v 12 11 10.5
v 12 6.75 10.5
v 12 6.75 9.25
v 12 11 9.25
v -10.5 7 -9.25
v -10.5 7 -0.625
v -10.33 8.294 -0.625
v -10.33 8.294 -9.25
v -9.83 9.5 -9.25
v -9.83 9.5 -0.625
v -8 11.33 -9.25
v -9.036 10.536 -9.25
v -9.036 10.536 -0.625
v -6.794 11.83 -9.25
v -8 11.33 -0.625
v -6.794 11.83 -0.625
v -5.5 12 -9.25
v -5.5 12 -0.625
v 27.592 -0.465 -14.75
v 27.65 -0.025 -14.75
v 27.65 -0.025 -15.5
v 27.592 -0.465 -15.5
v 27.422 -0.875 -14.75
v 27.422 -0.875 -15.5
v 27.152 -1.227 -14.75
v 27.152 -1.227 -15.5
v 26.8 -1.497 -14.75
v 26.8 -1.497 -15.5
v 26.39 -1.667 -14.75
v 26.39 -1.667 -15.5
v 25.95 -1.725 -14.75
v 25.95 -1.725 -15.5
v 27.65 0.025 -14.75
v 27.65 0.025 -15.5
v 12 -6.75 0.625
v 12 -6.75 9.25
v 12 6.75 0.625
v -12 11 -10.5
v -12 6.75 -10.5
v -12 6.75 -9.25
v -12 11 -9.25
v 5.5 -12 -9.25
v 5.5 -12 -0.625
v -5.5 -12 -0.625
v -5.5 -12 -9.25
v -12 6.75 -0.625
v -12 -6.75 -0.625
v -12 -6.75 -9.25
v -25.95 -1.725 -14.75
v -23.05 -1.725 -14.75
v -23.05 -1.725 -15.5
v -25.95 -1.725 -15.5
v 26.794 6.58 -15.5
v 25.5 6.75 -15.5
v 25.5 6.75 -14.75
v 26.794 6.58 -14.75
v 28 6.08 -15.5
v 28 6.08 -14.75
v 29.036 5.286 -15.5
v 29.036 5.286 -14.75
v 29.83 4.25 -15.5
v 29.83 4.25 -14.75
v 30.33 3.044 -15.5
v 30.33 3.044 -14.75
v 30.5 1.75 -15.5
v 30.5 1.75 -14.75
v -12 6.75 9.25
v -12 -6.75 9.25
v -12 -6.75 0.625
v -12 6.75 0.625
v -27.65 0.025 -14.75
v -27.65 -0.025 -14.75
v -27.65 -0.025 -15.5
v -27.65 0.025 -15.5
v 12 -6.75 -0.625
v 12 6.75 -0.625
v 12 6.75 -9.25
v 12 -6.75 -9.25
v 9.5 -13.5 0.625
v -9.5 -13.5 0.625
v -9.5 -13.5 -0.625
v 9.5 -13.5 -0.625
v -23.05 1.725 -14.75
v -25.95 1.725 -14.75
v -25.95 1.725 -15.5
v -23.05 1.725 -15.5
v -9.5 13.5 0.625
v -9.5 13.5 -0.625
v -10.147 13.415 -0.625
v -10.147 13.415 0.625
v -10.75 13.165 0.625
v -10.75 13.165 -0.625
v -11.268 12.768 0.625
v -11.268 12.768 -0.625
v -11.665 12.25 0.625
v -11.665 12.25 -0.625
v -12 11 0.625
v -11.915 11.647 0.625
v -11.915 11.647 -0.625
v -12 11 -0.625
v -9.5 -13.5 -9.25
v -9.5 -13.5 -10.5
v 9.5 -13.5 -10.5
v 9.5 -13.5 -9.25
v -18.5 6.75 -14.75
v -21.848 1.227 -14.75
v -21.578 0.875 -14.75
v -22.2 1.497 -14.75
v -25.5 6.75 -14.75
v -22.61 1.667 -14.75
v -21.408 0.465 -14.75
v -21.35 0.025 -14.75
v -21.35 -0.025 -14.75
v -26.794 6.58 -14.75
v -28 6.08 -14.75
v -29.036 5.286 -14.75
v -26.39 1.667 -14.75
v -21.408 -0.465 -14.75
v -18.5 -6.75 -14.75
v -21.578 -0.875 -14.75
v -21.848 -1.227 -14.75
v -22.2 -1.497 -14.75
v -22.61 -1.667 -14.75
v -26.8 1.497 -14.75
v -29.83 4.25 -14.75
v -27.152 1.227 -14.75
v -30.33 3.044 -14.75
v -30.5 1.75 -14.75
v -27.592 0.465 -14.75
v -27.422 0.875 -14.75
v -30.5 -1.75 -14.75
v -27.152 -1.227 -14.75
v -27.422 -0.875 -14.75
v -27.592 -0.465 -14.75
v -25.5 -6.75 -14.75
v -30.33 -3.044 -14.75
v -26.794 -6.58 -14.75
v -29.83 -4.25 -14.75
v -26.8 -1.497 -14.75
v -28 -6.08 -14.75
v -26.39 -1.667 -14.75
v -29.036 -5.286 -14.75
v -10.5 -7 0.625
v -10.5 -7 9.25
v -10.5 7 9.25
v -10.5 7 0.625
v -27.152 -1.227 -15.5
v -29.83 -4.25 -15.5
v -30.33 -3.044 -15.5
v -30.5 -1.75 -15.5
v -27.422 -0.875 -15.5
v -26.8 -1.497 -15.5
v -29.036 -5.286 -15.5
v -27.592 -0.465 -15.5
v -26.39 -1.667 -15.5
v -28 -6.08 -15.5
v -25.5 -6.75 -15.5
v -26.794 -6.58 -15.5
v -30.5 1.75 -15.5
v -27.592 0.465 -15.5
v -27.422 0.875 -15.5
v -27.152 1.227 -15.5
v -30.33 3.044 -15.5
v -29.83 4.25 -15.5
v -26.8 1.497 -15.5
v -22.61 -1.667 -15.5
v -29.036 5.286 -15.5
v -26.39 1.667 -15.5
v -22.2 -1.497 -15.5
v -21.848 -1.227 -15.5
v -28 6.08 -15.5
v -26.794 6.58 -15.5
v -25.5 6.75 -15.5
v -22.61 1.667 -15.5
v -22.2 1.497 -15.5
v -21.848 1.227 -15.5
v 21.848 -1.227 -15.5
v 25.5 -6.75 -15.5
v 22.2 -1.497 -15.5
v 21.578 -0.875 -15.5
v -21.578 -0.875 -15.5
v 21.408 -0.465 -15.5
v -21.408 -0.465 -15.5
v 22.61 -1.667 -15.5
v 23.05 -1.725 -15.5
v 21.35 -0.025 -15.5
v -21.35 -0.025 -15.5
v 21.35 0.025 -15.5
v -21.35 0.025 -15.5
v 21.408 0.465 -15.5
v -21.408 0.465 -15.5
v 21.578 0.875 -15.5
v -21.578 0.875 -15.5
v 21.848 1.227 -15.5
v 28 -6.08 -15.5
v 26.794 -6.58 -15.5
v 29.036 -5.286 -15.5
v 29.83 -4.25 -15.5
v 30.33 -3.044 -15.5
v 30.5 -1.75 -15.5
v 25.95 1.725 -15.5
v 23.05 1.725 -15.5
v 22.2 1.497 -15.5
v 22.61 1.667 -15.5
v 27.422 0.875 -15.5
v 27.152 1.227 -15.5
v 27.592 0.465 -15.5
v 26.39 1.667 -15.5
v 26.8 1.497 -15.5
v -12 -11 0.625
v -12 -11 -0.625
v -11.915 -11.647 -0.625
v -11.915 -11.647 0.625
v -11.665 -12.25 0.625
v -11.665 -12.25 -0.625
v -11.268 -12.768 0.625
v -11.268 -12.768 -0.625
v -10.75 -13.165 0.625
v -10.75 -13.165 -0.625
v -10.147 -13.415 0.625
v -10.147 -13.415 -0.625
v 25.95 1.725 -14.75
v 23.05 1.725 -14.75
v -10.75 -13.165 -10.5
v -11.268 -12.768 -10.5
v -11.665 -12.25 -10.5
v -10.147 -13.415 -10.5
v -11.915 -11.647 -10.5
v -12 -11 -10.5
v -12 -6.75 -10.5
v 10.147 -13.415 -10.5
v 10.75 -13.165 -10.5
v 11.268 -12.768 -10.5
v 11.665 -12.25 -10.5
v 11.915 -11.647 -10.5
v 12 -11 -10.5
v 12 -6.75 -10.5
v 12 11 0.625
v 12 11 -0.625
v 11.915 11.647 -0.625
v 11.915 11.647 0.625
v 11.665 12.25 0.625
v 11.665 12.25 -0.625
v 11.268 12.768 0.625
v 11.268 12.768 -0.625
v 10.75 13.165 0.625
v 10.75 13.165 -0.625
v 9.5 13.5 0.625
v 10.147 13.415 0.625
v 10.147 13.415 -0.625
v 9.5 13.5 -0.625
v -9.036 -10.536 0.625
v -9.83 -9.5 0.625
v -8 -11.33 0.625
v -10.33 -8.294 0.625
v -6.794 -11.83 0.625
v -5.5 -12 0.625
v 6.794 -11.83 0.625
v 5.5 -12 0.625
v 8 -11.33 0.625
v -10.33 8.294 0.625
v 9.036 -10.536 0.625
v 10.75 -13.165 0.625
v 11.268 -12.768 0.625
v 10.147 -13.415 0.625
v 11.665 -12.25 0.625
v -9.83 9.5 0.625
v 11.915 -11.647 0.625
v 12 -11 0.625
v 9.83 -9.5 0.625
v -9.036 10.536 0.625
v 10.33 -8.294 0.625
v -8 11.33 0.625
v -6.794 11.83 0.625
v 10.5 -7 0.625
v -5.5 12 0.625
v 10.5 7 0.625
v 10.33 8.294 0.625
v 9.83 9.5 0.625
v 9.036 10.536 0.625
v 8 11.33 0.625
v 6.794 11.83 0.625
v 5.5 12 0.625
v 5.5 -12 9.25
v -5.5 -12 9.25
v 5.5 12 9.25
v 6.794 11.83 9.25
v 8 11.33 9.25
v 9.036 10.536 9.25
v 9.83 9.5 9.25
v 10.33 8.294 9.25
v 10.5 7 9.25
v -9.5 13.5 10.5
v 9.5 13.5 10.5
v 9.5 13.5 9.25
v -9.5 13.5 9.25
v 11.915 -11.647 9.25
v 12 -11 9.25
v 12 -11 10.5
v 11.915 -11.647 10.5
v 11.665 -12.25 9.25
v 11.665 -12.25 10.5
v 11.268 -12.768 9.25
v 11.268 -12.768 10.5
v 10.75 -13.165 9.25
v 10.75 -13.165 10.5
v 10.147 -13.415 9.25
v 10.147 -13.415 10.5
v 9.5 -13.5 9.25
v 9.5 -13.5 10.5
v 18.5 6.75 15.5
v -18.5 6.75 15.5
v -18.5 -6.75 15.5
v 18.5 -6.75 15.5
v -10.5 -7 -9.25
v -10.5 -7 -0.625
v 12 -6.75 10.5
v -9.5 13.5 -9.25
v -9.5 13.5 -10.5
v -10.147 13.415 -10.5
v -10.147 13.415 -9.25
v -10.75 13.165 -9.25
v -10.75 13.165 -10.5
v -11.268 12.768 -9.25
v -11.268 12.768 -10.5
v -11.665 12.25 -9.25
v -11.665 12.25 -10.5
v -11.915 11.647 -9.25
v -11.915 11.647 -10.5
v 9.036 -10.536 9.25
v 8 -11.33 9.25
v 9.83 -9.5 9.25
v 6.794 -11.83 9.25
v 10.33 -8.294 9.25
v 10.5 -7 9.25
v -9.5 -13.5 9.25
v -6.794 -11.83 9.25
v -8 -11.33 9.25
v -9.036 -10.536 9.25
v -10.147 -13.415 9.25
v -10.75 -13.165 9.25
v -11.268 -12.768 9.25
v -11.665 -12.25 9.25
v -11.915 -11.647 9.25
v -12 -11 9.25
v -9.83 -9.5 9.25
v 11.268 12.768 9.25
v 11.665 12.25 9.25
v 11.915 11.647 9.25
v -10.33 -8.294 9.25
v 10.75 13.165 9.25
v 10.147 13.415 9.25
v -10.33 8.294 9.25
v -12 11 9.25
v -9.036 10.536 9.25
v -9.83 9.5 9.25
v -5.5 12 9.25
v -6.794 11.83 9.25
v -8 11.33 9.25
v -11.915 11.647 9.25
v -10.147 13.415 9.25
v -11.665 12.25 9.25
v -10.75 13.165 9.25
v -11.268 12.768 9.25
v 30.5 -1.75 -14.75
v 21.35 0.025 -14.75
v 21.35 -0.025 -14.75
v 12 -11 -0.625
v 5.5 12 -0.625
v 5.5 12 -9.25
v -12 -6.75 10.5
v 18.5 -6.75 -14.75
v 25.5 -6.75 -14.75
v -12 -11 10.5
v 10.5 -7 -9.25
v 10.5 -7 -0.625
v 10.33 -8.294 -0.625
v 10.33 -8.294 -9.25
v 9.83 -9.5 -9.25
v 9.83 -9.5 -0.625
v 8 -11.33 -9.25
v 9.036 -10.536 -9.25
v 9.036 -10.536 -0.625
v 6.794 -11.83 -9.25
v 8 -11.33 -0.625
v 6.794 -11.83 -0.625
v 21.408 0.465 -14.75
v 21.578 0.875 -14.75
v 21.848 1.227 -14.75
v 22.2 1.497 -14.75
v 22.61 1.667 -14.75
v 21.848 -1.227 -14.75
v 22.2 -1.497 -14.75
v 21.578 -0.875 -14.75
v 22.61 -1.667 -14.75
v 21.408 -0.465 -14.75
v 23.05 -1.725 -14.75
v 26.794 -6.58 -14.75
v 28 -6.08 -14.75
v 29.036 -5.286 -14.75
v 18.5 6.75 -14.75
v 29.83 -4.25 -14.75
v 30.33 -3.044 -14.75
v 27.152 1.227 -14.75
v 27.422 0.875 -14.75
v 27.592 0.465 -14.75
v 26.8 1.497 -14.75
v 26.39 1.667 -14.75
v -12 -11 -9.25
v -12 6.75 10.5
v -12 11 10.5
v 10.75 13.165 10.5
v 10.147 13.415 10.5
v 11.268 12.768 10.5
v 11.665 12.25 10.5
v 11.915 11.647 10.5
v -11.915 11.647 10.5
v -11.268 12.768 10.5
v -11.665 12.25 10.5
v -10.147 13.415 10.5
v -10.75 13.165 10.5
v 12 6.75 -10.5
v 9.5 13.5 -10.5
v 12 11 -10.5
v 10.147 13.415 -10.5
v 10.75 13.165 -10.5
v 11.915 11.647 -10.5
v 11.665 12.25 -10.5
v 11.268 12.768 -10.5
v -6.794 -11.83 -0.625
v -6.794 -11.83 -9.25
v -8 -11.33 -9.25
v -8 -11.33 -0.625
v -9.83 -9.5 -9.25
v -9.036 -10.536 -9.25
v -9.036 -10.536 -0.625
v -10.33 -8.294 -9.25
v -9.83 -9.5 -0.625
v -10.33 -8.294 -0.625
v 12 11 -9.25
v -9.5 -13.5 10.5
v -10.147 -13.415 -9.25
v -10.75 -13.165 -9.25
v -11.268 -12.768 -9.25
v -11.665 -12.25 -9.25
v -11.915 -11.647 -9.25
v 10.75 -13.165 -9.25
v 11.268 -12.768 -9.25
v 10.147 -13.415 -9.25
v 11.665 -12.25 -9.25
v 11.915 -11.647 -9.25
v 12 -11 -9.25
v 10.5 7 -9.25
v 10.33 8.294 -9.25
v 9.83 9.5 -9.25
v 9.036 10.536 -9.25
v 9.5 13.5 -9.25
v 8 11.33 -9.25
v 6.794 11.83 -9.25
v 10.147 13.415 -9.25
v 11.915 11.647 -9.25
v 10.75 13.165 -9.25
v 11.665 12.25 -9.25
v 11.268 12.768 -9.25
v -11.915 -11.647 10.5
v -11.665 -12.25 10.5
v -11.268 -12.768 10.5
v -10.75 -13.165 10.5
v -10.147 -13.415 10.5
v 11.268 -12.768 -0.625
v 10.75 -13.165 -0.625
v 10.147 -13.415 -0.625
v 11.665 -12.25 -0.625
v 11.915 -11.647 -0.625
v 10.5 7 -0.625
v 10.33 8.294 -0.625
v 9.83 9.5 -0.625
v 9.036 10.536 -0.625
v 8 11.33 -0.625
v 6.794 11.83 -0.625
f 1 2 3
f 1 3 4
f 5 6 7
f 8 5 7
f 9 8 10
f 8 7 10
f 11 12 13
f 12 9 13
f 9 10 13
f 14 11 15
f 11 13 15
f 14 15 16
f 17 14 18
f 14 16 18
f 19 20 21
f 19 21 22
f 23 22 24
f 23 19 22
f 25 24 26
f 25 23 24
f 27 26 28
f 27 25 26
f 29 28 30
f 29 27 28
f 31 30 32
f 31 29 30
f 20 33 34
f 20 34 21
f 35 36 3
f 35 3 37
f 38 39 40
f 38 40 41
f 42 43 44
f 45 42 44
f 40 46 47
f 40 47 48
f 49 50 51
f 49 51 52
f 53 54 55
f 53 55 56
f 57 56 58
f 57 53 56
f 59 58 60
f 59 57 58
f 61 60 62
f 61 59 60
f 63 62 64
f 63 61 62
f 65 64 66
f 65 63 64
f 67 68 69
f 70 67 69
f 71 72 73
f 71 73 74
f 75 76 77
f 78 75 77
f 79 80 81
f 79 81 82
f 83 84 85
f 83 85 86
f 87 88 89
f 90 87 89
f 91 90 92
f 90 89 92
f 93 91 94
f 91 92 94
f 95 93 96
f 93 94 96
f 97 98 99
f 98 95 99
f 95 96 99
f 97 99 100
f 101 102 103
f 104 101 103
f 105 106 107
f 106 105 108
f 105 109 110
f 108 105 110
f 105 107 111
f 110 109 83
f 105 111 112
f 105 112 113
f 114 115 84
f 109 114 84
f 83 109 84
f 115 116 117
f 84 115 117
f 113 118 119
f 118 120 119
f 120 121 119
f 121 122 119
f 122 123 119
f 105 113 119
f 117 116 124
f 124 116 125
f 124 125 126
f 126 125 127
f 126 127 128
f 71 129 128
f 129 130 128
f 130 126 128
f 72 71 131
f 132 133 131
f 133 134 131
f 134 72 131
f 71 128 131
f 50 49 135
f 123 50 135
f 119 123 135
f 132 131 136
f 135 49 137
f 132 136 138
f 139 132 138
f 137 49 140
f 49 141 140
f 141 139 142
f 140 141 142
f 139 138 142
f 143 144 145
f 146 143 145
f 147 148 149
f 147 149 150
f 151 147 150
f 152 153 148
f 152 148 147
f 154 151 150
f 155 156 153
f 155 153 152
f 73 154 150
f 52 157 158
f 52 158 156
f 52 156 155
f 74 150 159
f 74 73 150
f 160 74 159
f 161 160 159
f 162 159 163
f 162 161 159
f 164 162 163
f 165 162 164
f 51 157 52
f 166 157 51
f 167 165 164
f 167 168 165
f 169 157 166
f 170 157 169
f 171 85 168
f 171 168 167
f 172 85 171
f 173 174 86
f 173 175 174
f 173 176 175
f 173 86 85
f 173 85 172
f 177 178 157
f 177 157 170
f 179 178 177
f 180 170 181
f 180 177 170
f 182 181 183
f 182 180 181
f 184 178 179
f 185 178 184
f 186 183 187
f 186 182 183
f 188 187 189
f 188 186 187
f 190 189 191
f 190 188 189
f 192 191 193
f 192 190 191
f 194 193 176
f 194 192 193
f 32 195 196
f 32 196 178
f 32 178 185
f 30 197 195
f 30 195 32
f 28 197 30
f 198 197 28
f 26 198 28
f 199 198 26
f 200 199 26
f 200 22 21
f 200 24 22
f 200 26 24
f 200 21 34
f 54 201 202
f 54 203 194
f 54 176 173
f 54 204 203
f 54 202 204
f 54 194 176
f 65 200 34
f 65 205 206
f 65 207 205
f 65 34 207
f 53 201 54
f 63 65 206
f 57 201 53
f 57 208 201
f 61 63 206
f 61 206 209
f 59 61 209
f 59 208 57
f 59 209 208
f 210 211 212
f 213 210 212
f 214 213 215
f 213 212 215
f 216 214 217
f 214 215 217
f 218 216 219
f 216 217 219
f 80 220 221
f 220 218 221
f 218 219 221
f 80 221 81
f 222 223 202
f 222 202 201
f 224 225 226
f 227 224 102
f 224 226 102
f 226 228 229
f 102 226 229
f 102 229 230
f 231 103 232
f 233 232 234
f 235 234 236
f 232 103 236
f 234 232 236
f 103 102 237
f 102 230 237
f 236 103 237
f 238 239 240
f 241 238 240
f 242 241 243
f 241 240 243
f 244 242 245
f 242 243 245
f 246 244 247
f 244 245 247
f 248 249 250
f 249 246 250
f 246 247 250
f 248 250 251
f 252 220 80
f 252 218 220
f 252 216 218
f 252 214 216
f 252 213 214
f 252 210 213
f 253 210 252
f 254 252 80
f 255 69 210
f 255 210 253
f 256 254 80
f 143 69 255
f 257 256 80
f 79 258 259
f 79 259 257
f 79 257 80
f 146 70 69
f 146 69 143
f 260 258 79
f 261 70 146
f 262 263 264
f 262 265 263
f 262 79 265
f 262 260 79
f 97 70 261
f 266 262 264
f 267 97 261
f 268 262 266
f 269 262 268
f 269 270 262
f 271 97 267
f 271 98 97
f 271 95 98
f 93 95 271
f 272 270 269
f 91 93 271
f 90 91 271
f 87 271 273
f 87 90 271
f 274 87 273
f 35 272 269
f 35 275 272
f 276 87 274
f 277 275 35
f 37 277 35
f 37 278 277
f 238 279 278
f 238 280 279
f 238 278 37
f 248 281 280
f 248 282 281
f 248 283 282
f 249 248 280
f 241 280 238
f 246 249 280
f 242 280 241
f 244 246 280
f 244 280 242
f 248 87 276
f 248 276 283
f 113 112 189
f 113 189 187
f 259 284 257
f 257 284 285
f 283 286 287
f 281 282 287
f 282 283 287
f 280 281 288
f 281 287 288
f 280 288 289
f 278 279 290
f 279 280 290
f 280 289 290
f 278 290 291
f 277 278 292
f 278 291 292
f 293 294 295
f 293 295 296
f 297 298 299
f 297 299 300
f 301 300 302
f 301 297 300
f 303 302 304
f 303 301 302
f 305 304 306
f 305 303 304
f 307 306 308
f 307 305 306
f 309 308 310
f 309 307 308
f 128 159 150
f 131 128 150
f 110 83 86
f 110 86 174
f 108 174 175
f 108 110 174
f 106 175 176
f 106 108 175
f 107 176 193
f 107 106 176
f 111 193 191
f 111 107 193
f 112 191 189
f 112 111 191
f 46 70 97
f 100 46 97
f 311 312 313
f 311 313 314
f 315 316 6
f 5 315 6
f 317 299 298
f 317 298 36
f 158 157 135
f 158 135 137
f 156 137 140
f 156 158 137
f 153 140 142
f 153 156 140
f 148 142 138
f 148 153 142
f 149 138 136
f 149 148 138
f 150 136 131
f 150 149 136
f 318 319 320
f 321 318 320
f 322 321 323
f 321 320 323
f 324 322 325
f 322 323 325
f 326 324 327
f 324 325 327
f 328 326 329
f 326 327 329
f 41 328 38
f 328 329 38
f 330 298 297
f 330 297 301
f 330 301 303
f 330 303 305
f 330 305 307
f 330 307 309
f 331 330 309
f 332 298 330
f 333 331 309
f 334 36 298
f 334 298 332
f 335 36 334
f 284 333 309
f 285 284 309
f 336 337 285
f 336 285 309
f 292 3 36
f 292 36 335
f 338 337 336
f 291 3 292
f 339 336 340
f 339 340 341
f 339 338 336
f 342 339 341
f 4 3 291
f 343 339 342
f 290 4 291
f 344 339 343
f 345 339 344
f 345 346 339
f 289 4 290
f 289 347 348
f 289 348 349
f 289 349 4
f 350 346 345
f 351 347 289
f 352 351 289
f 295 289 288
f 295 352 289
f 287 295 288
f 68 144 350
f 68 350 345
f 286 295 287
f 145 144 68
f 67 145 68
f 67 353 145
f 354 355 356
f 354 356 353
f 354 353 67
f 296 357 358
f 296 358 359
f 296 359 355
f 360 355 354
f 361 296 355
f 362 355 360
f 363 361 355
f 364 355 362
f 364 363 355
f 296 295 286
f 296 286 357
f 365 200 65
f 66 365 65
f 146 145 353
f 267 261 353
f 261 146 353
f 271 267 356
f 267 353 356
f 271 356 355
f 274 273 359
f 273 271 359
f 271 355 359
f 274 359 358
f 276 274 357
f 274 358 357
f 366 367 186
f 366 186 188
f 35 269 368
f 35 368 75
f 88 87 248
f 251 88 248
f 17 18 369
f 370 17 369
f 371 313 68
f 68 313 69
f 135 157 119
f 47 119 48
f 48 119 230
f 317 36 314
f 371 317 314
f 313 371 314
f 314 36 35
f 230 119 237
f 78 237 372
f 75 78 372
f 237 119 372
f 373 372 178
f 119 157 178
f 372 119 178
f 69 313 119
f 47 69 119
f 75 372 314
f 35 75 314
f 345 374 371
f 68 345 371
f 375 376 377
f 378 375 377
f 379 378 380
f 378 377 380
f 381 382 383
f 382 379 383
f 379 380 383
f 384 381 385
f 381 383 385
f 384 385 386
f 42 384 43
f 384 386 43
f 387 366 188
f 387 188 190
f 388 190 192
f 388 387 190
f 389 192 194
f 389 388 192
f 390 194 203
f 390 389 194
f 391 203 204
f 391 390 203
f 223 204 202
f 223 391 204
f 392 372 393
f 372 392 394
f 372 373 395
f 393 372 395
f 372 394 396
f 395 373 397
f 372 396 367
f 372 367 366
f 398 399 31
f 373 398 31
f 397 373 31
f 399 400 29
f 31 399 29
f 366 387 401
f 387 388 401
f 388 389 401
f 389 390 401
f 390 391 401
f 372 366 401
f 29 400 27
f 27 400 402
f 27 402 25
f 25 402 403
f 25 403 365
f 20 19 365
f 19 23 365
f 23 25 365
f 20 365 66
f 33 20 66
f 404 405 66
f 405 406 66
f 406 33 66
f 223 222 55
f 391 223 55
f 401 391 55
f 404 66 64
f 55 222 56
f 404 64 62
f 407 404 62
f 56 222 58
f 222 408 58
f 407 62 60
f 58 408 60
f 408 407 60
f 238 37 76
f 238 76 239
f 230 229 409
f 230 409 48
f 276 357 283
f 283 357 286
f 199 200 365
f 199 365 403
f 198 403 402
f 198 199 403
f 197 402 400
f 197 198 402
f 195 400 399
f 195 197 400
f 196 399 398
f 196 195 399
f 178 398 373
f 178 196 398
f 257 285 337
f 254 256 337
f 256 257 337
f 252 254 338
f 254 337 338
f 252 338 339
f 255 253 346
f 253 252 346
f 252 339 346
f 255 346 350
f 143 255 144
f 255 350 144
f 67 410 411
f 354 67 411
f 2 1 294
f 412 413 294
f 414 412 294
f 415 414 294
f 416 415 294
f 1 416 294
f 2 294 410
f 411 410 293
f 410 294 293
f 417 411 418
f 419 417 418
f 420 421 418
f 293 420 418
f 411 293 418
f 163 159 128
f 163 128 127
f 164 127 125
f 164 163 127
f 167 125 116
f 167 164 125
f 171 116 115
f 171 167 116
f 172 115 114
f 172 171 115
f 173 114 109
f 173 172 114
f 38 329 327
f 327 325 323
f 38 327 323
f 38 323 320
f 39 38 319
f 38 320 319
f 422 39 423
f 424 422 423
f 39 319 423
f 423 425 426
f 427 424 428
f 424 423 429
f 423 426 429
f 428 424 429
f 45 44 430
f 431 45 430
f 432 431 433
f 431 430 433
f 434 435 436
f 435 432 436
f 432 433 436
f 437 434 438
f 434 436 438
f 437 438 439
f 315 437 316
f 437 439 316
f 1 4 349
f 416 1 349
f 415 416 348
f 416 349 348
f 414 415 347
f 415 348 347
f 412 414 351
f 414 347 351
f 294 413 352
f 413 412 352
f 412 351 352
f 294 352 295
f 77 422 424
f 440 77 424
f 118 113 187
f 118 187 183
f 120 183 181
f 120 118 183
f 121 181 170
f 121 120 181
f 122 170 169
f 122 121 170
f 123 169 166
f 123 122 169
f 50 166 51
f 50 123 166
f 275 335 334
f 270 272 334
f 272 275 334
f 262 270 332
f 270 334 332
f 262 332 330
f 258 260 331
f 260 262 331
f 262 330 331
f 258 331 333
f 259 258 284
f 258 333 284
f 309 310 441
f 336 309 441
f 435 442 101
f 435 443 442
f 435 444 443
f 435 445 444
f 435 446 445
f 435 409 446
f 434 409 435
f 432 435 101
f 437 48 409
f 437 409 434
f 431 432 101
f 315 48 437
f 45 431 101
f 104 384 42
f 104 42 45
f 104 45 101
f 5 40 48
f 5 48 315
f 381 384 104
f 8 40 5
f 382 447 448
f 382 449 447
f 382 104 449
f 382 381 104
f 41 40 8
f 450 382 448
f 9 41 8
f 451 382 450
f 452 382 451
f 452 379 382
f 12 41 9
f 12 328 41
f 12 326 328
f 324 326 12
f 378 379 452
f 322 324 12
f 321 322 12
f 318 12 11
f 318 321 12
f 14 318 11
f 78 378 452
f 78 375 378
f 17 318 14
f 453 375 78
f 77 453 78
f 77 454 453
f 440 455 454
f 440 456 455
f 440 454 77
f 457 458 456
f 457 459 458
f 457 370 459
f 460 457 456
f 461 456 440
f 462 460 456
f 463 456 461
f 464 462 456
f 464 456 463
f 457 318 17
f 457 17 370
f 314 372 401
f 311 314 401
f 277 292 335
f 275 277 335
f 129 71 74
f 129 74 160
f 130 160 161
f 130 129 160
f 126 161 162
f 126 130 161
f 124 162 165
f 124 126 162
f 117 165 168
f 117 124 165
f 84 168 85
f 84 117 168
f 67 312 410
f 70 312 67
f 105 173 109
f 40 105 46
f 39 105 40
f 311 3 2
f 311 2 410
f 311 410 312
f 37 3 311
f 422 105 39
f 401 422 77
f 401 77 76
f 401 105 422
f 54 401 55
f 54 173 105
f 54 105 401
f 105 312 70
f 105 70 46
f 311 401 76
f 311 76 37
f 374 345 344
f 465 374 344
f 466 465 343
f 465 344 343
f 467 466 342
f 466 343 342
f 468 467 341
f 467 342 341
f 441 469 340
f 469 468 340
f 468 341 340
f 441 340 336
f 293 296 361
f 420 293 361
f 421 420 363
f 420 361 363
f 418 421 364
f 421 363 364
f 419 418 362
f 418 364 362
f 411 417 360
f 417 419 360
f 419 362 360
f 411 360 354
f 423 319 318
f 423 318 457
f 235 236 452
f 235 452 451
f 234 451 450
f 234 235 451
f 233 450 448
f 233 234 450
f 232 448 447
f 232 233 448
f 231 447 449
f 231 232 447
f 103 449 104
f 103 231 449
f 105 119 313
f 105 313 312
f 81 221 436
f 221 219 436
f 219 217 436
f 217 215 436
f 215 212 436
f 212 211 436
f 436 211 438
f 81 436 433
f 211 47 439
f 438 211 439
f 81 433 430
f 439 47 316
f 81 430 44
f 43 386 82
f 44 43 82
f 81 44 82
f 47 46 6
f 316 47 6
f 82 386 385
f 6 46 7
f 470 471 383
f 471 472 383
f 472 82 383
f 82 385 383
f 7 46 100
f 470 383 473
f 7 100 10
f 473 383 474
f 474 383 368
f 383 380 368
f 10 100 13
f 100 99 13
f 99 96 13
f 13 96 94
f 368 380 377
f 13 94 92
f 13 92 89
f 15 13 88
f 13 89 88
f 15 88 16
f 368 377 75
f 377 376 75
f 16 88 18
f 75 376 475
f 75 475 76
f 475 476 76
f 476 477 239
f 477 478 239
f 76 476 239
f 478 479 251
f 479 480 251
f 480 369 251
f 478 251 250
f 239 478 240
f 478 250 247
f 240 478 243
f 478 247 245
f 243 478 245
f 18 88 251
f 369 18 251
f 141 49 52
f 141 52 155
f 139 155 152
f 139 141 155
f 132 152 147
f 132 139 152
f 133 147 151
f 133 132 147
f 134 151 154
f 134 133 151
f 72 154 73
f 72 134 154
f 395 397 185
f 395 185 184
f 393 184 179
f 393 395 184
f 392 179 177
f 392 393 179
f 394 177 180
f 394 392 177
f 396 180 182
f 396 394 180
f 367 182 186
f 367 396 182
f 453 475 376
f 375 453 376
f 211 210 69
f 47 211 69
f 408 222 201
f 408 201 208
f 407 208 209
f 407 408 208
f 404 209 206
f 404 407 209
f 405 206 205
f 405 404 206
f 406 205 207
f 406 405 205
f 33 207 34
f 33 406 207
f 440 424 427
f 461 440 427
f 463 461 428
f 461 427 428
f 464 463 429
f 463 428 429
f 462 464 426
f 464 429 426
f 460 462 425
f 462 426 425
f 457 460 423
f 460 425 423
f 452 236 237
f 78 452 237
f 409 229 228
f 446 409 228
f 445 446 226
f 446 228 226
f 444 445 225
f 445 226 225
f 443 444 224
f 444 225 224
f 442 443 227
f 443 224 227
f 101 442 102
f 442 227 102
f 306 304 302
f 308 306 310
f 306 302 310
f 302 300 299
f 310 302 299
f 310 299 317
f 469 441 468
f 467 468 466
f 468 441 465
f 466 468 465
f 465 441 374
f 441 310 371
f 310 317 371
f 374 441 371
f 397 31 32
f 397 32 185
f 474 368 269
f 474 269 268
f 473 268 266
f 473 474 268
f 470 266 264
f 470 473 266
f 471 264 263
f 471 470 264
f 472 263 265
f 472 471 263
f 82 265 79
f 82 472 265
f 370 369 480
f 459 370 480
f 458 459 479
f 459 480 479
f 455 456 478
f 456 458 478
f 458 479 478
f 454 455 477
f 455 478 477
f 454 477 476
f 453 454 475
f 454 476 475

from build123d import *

# Parameters (mm, degrees)
SKETCH1_W           = 37
SKETCH1_H           = 13.5
BOSS_EXTRUDE1_DEPTH = 15.5
SKETCH2_W           = 24
SKETCH2_H           = 21
CUT_EXTRUDE1_DEPTH  = 31
SKETCH3_W           = 24
SKETCH3_H           = 27
BOSS_EXTRUDE2_DEPTH = 1.25
SKETCH4_W           = 24
SKETCH4_H           = 27
BOSS_EXTRUDE3_DEPTH = 1.25
SKETCH5_W           = 24
SKETCH5_H           = 27
BOSS_EXTRUDE4_DEPTH = 0.625
CUT_EXTRUDE2_DEPTH  = 30
CUT_EXTRUDE3_DEPTH  = 30
BOSS_EXTRUDE5_DEPTH = 10
SKETCH9_W           = 13.5
SKETCH9_H           = 12
BOSS_EXTRUDE6_DEPTH = 0.75
CUT_EXTRUDE6_START  = -0.75
CUT_EXTRUDE6_DEPTH  = 0.75
CUT_EXTRUDE7_DEPTH  = 0.75
SKETCH15_W          = 13.5
SKETCH15_H          = 12
BOSS_EXTRUDE7_DEPTH = 0.75
CUT_EXTRUDE8_START  = -0.75
CUT_EXTRUDE8_DEPTH  = 0.75
CUT_EXTRUDE9_DEPTH  = 0.75


# Read off the part's stored shape, not the designer's step: Cut-Extrude6, Cut-Extrude8
with BuildPart() as part:
    # Sketch1 → Boss-Extrude1 (new, symmetric)
    with BuildSketch(Plane.XY):
        Rectangle(SKETCH1_W, SKETCH1_H)
    extrude(amount=BOSS_EXTRUDE1_DEPTH, both=True)

    # Sketch2 → Cut-Extrude1 (cut)
    with BuildSketch(Plane(origin=(0, 6.75, 0), x_dir=(1, 0, 0), z_dir=(0, 1, 0))):
        Rectangle(SKETCH2_W, SKETCH2_H)
    extrude(amount=-CUT_EXTRUDE1_DEPTH, mode=Mode.SUBTRACT)

    # Sketch3 → Boss-Extrude2 (add)
    with BuildSketch(Plane.XY.offset(-10.5)):
        Rectangle(SKETCH3_W, SKETCH3_H)
    extrude(amount=BOSS_EXTRUDE2_DEPTH)

    # Sketch4 → Boss-Extrude3 (add)
    with BuildSketch(Plane(origin=(0, 0, 10.5), x_dir=(-1, 0, 0), z_dir=(0, 0, -1))):
        Rectangle(SKETCH4_W, SKETCH4_H)
    extrude(amount=BOSS_EXTRUDE3_DEPTH)

    # Sketch5 → Boss-Extrude4 (add, symmetric)
    with BuildSketch(Plane.XY):
        Rectangle(SKETCH5_W, SKETCH5_H)
    extrude(amount=BOSS_EXTRUDE4_DEPTH, both=True)

    # Sketch6 → Cut-Extrude2 (cut)
    with BuildSketch(Plane(origin=(0, 0, -10.5), x_dir=(-1, 0, 0), z_dir=(0, 0, -1))):
        with BuildLine():
            Line((-12, -13.5), (-12, -11))
            ThreePointArc((-12, -11), (-11.267766953, -12.767766953), (-9.5, -13.5))
            Line((-9.5, -13.5), (-12, -13.5))
        make_face()
        with BuildLine():
            Line((12, -13.5), (12, -11))
            ThreePointArc((12, -11), (11.267766953, -12.767766953), (9.5, -13.5))
            Line((9.5, -13.5), (12, -13.5))
        make_face()
    extrude(amount=-CUT_EXTRUDE2_DEPTH, mode=Mode.SUBTRACT)

    # Sketch7 → Cut-Extrude3 (cut)
    with BuildSketch(Plane(origin=(0, 0, -10.5), x_dir=(-1, 0, 0), z_dir=(0, 0, -1))):
        with BuildLine():
            Line((12, 13.5), (9.5, 13.5))
            ThreePointArc((9.5, 13.5), (11.267766953, 12.767766953), (12, 11))
            Line((12, 11), (12, 13.5))
        make_face()
        with BuildLine():
            Line((-12, 13.5), (-12, 11))
            ThreePointArc((-12, 11), (-11.267766953, 12.767766953), (-9.5, 13.5))
            Line((-9.5, 13.5), (-12, 13.5))
        make_face()
    extrude(amount=-CUT_EXTRUDE3_DEPTH, mode=Mode.SUBTRACT)

    # Sketch8 → Boss-Extrude5 (add, symmetric)
    with BuildSketch(Plane.XY):
        with BuildLine():
            Line((-5.5, 12), (5.5, 12))
            ThreePointArc((5.5, 12), (9.035533906, 10.535533906), (10.5, 7))
            Line((10.5, 7), (10.5, -7))
            ThreePointArc((10.5, -7), (9.035533906, -10.535533906), (5.5, -12))
            Line((5.5, -12), (-5.5, -12))
            ThreePointArc((-5.5, -12), (-9.035533906, -10.535533906), (-10.5, -7))
            Line((-10.5, -7), (-10.5, 7))
            ThreePointArc((-10.5, 7), (-9.035533906, 10.535533906), (-5.5, 12))
        make_face()
    extrude(amount=BOSS_EXTRUDE5_DEPTH, both=True)

    # Sketch9 → Boss-Extrude6 (add)
    with BuildSketch(Plane(origin=(0, 0, -15.5), x_dir=(0, -1, 0), z_dir=(0, 0, -1))):
        with Locations((0, 24.5)):
            Rectangle(SKETCH9_W, SKETCH9_H)
    extrude(amount=-BOSS_EXTRUDE6_DEPTH)

    # Cut-Extrude6 outline → Cut-Extrude6 (cut)
    with BuildSketch(Plane.XY.offset(-14.75).offset(CUT_EXTRUDE6_START)):
        with BuildLine():
            Line((-30.5, 6.75), (-30.5, 1.75))
            ThreePointArc((-30.5, 1.75), (-29.035533906, 5.285533906), (-25.5, 6.75))
            Line((-25.5, 6.75), (-30.5, 6.75))
        make_face()
        with BuildLine():
            ThreePointArc((-25.5, -6.75), (-29.035533906, -5.285533906), (-30.5, -1.75))
            Line((-30.5, -1.75), (-30.5, -6.75))
            Line((-30.5, -6.75), (-25.5, -6.75))
        make_face()
    extrude(amount=CUT_EXTRUDE6_DEPTH, mode=Mode.SUBTRACT)

    # Sketch14 → Cut-Extrude7 (cut)
    with BuildSketch(Plane.XY.offset(-14.75)):
        with BuildLine():
            Line((-25.95, 1.725), (-23.05, 1.725))
            ThreePointArc((-23.05, 1.725), (-21.847918472, 1.227081528), (-21.35, 0.025))
            Line((-21.35, 0.025), (-21.35, -0.025))
            ThreePointArc((-21.35, -0.025), (-21.847918472, -1.227081528), (-23.05, -1.725))
            Line((-23.05, -1.725), (-25.95, -1.725))
            ThreePointArc((-25.95, -1.725), (-27.152081528, -1.227081528), (-27.65, -0.025))
            Line((-27.65, -0.025), (-27.65, 0.025))
            ThreePointArc((-27.65, 0.025), (-27.152081528, 1.227081528), (-25.95, 1.725))
        make_face()
    extrude(amount=-CUT_EXTRUDE7_DEPTH, mode=Mode.SUBTRACT)

    # Sketch15 → Boss-Extrude7 (add)
    with BuildSketch(Plane.YX.offset(15.5)):
        with Locations((0, 24.5)):
            Rectangle(SKETCH15_W, SKETCH15_H)
    extrude(amount=-BOSS_EXTRUDE7_DEPTH)

    # Cut-Extrude8 outline → Cut-Extrude8 (cut)
    with BuildSketch(Plane.XY.offset(-14.75).offset(CUT_EXTRUDE8_START)):
        with BuildLine():
            Line((30.5, -6.75), (30.5, -1.75))
            ThreePointArc((30.5, -1.75), (29.035533906, -5.285533906), (25.5, -6.75))
            Line((25.5, -6.75), (30.5, -6.75))
        make_face()
        with BuildLine():
            ThreePointArc((25.5, 6.75), (29.035533906, 5.285533906), (30.5, 1.75))
            Line((30.5, 1.75), (30.5, 6.75))
            Line((30.5, 6.75), (25.5, 6.75))
        make_face()
    extrude(amount=CUT_EXTRUDE8_DEPTH, mode=Mode.SUBTRACT)

    # Sketch18 → Cut-Extrude9 (cut)
    with BuildSketch(Plane.XY.offset(-14.75)):
        with BuildLine():
            Line((23.05, 1.725), (25.95, 1.725))
            ThreePointArc((25.95, 1.725), (27.152081528, 1.227081528), (27.65, 0.025))
            Line((27.65, 0.025), (27.65, -0.025))
            ThreePointArc((27.65, -0.025), (27.152081528, -1.227081528), (25.95, -1.725))
            Line((25.95, -1.725), (23.05, -1.725))
            ThreePointArc((23.05, -1.725), (21.847918472, -1.227081528), (21.35, -0.025))
            Line((21.35, -0.025), (21.35, 0.025))
            ThreePointArc((21.35, 0.025), (21.847918472, 1.227081528), (23.05, 1.725))
        make_face()
    extrude(amount=-CUT_EXTRUDE9_DEPTH, mode=Mode.SUBTRACT)


solid = part.part
